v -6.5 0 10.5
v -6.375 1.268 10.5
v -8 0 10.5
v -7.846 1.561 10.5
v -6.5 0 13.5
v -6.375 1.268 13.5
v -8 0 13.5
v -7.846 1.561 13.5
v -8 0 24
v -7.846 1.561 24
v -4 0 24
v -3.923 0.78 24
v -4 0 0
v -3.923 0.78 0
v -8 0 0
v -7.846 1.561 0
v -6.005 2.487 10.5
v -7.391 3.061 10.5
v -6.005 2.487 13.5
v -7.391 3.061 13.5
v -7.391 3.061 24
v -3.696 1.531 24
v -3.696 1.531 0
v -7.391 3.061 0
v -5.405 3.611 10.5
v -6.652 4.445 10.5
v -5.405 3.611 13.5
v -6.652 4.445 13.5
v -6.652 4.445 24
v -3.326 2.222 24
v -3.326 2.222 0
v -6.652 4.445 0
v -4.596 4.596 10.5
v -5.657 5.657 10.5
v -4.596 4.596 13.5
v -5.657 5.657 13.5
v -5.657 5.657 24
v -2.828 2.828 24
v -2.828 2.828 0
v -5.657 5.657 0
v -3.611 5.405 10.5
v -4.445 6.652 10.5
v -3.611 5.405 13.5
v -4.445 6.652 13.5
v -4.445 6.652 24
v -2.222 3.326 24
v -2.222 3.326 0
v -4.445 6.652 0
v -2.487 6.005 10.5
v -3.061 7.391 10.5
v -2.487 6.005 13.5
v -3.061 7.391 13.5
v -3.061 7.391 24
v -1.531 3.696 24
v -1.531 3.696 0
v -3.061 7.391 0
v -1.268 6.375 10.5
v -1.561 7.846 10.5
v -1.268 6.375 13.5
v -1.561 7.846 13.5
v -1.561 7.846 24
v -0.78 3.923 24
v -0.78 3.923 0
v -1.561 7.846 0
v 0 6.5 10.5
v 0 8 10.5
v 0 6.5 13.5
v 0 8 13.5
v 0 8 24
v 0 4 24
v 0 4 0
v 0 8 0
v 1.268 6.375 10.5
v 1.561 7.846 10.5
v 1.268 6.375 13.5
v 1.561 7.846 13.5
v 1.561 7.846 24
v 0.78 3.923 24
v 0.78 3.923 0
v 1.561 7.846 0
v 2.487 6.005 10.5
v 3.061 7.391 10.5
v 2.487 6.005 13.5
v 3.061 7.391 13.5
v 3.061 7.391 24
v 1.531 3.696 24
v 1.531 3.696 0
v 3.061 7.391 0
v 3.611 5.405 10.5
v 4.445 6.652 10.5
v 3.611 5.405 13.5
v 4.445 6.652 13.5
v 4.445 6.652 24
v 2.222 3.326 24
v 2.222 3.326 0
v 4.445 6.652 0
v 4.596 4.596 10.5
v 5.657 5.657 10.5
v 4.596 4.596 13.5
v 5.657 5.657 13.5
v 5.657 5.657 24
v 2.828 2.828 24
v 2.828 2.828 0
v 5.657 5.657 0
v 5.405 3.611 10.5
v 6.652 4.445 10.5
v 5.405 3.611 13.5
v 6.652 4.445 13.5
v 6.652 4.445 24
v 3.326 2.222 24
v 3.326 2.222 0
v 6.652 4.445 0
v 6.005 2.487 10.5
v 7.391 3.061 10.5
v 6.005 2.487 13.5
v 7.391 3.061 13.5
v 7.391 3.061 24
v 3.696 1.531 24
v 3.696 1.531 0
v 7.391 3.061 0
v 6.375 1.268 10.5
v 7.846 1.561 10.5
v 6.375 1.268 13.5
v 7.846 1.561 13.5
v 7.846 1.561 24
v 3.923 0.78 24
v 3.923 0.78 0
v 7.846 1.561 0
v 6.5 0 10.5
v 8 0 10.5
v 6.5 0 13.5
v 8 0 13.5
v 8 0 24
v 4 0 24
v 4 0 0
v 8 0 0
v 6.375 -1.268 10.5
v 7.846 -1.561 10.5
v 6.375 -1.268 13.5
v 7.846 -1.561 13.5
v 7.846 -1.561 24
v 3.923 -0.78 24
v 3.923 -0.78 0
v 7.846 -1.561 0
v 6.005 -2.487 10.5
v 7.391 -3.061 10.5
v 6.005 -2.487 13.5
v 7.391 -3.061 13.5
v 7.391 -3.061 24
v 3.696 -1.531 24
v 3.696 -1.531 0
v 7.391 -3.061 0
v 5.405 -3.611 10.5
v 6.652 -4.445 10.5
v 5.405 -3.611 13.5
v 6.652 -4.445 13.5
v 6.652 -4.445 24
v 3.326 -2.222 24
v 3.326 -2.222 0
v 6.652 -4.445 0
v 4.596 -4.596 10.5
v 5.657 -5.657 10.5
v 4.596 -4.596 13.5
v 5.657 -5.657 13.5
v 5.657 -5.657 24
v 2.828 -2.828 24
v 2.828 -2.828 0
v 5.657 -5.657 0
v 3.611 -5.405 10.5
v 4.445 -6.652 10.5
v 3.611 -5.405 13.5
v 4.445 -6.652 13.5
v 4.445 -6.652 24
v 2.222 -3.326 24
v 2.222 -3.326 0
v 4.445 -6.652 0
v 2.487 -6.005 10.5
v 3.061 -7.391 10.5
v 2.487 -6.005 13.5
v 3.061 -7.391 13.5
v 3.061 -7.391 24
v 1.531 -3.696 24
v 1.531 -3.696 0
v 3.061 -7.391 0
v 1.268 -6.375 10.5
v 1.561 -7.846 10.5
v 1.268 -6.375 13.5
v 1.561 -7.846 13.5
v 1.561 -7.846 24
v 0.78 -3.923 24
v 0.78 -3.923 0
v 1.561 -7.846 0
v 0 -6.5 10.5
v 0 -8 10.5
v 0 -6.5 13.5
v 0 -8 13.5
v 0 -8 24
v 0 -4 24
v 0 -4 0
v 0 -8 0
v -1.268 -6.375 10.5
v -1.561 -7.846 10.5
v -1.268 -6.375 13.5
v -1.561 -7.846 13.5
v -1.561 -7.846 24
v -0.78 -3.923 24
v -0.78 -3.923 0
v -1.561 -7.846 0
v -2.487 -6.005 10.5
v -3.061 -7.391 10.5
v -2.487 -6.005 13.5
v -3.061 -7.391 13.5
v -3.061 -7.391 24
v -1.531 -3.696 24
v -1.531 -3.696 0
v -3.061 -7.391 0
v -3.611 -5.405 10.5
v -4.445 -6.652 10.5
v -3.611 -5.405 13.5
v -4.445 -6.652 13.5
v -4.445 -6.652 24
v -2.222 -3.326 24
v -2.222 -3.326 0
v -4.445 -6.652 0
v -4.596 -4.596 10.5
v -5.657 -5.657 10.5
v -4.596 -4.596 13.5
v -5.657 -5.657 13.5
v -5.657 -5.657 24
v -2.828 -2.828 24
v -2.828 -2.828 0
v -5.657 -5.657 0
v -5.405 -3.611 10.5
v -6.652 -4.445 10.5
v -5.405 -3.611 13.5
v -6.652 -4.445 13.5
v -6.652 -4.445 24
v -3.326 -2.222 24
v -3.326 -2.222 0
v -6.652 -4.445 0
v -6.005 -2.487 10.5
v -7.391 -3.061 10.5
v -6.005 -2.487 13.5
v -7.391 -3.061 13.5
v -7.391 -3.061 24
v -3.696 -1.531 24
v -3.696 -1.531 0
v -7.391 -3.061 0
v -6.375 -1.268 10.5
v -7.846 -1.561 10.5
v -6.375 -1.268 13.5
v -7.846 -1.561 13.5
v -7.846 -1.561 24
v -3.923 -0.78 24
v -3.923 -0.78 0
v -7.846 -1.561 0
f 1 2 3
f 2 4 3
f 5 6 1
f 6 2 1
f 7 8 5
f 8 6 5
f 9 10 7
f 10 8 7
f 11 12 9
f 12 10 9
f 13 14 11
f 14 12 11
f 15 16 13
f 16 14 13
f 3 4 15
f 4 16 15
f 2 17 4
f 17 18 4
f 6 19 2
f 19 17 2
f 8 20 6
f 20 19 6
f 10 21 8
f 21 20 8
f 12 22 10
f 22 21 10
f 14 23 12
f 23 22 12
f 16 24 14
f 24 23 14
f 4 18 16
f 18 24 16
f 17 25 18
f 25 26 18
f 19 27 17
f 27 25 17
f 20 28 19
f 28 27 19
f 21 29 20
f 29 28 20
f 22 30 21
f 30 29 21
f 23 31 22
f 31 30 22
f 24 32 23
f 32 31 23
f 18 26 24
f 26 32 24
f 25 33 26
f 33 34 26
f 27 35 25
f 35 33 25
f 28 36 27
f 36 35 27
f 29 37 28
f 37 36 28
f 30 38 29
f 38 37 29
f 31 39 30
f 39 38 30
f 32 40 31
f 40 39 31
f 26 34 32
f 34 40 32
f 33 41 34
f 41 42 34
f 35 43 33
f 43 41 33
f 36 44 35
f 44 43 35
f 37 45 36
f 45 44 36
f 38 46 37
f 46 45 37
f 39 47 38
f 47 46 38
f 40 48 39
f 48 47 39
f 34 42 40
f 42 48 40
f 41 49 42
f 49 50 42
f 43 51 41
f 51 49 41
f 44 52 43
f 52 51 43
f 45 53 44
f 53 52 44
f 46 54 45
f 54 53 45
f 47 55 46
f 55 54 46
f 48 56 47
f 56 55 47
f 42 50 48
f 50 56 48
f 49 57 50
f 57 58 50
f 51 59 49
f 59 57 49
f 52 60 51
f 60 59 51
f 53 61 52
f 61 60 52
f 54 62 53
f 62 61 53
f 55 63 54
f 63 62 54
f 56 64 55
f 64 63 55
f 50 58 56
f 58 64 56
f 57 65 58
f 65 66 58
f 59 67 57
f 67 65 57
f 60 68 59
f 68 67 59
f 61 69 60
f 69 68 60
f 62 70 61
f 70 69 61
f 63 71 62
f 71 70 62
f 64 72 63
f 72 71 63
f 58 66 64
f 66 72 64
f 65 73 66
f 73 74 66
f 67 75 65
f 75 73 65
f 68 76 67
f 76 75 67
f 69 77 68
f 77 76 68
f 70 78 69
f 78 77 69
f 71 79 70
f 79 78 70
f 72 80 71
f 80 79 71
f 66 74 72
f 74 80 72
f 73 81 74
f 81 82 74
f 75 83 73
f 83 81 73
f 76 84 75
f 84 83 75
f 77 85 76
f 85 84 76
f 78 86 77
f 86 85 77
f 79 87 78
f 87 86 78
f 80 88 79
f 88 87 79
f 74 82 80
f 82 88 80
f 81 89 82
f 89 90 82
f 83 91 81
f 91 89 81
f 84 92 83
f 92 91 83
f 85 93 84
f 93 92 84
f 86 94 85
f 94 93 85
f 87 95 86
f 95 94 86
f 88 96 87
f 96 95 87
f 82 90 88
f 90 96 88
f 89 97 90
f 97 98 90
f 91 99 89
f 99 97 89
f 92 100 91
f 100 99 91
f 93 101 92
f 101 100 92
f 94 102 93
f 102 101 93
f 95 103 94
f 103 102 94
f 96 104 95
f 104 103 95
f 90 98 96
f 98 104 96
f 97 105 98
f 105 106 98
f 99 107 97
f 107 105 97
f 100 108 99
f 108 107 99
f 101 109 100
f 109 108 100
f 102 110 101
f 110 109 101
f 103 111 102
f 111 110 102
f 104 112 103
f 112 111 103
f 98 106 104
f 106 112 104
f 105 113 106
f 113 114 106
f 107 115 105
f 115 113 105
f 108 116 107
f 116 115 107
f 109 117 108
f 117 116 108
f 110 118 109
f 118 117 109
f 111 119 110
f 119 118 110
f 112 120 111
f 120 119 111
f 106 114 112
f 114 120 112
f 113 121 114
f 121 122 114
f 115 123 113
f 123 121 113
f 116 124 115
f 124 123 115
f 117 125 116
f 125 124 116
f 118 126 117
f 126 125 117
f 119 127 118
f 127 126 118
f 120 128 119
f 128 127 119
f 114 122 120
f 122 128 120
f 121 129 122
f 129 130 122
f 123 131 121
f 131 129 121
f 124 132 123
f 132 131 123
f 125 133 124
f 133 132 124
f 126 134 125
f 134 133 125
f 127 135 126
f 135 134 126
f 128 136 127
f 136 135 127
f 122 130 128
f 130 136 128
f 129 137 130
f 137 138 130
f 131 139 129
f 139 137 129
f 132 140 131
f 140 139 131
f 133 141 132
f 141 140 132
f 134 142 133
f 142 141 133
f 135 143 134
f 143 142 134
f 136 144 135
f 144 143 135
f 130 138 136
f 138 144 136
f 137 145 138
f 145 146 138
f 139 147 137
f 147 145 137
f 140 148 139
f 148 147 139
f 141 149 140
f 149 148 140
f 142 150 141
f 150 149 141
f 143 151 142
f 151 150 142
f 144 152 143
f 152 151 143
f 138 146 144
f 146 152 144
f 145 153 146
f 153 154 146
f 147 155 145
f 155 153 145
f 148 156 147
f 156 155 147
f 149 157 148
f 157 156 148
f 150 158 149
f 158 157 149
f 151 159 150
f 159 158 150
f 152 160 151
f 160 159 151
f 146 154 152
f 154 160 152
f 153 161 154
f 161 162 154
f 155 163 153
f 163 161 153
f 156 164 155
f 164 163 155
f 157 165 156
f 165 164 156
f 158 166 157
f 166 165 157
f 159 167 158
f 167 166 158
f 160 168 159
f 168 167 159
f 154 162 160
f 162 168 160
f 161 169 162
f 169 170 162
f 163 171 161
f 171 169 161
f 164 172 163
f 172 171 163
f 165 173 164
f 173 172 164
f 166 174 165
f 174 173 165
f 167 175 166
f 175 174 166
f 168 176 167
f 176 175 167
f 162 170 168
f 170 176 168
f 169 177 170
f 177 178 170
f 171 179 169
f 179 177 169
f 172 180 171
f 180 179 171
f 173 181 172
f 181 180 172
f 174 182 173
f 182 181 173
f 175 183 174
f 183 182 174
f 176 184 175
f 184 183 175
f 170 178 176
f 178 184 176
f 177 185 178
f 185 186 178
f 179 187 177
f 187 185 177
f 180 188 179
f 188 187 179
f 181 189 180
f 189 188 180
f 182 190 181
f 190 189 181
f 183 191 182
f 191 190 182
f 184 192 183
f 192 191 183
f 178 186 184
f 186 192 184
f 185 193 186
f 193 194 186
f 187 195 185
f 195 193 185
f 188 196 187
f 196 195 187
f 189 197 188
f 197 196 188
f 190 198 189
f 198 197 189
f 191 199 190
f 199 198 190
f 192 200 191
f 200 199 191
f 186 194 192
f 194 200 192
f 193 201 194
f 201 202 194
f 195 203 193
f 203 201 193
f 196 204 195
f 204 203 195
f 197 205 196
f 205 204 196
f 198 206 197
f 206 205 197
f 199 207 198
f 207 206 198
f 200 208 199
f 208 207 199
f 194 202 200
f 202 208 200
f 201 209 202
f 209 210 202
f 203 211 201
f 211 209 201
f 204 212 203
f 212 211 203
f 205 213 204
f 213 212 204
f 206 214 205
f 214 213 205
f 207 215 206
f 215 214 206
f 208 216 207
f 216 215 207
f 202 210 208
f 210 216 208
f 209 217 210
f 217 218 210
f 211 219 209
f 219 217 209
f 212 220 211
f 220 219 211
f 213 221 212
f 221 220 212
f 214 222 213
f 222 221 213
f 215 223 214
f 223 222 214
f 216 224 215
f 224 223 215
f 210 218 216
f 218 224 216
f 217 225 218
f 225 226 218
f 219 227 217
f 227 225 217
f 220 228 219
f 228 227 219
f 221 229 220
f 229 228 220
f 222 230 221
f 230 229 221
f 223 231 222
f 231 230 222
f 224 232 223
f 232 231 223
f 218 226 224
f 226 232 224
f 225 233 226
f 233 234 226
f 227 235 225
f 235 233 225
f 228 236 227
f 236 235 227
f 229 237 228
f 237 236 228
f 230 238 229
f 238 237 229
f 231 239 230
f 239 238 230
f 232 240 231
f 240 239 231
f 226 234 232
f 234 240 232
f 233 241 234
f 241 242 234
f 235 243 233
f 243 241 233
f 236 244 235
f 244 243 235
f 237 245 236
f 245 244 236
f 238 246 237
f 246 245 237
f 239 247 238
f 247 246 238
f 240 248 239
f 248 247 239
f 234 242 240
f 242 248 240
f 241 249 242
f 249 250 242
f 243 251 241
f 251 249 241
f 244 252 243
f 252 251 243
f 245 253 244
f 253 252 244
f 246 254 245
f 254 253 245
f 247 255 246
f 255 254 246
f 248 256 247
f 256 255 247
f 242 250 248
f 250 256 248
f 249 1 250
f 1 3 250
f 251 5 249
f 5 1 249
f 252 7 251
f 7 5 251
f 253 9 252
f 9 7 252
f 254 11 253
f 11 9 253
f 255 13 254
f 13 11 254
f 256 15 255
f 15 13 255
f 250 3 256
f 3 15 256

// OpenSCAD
$fn = 32;

// ----------------------------------------------------------------------
// Grooved revolve: stepped, bore R4
// ----------------------------------------------------------------------

// --- parameters (mm) ---
bore_r = 4;               // bore radius
outer_r = 8;              // outer radius of the body
total_h = 24;             // overall height, Z
wall = 4;                 // radial wall thickness
groove_w = 3;             // groove width
groove_d = 1.5;           // groove depth
grooves = 1;              // number of outer grooves

bbox_x = 2 * outer_r;  // full diameter
bore_d = 2 * bore_r;  // bore diameter
body_d = 2 * outer_r;  // body diameter
revolve_angle = 360;  // full turn around the Z axis

profile = [[4, 0], [8, 0], [8, 10.5], [6.5, 10.5], [6.5, 13.5], [8, 13.5], [8, 24], [4, 24]];  // primary outline, 8 points, counter clockwise

// --- the one profile operation ---
rotate_extrude(angle = revolve_angle) polygon(points = profile);
